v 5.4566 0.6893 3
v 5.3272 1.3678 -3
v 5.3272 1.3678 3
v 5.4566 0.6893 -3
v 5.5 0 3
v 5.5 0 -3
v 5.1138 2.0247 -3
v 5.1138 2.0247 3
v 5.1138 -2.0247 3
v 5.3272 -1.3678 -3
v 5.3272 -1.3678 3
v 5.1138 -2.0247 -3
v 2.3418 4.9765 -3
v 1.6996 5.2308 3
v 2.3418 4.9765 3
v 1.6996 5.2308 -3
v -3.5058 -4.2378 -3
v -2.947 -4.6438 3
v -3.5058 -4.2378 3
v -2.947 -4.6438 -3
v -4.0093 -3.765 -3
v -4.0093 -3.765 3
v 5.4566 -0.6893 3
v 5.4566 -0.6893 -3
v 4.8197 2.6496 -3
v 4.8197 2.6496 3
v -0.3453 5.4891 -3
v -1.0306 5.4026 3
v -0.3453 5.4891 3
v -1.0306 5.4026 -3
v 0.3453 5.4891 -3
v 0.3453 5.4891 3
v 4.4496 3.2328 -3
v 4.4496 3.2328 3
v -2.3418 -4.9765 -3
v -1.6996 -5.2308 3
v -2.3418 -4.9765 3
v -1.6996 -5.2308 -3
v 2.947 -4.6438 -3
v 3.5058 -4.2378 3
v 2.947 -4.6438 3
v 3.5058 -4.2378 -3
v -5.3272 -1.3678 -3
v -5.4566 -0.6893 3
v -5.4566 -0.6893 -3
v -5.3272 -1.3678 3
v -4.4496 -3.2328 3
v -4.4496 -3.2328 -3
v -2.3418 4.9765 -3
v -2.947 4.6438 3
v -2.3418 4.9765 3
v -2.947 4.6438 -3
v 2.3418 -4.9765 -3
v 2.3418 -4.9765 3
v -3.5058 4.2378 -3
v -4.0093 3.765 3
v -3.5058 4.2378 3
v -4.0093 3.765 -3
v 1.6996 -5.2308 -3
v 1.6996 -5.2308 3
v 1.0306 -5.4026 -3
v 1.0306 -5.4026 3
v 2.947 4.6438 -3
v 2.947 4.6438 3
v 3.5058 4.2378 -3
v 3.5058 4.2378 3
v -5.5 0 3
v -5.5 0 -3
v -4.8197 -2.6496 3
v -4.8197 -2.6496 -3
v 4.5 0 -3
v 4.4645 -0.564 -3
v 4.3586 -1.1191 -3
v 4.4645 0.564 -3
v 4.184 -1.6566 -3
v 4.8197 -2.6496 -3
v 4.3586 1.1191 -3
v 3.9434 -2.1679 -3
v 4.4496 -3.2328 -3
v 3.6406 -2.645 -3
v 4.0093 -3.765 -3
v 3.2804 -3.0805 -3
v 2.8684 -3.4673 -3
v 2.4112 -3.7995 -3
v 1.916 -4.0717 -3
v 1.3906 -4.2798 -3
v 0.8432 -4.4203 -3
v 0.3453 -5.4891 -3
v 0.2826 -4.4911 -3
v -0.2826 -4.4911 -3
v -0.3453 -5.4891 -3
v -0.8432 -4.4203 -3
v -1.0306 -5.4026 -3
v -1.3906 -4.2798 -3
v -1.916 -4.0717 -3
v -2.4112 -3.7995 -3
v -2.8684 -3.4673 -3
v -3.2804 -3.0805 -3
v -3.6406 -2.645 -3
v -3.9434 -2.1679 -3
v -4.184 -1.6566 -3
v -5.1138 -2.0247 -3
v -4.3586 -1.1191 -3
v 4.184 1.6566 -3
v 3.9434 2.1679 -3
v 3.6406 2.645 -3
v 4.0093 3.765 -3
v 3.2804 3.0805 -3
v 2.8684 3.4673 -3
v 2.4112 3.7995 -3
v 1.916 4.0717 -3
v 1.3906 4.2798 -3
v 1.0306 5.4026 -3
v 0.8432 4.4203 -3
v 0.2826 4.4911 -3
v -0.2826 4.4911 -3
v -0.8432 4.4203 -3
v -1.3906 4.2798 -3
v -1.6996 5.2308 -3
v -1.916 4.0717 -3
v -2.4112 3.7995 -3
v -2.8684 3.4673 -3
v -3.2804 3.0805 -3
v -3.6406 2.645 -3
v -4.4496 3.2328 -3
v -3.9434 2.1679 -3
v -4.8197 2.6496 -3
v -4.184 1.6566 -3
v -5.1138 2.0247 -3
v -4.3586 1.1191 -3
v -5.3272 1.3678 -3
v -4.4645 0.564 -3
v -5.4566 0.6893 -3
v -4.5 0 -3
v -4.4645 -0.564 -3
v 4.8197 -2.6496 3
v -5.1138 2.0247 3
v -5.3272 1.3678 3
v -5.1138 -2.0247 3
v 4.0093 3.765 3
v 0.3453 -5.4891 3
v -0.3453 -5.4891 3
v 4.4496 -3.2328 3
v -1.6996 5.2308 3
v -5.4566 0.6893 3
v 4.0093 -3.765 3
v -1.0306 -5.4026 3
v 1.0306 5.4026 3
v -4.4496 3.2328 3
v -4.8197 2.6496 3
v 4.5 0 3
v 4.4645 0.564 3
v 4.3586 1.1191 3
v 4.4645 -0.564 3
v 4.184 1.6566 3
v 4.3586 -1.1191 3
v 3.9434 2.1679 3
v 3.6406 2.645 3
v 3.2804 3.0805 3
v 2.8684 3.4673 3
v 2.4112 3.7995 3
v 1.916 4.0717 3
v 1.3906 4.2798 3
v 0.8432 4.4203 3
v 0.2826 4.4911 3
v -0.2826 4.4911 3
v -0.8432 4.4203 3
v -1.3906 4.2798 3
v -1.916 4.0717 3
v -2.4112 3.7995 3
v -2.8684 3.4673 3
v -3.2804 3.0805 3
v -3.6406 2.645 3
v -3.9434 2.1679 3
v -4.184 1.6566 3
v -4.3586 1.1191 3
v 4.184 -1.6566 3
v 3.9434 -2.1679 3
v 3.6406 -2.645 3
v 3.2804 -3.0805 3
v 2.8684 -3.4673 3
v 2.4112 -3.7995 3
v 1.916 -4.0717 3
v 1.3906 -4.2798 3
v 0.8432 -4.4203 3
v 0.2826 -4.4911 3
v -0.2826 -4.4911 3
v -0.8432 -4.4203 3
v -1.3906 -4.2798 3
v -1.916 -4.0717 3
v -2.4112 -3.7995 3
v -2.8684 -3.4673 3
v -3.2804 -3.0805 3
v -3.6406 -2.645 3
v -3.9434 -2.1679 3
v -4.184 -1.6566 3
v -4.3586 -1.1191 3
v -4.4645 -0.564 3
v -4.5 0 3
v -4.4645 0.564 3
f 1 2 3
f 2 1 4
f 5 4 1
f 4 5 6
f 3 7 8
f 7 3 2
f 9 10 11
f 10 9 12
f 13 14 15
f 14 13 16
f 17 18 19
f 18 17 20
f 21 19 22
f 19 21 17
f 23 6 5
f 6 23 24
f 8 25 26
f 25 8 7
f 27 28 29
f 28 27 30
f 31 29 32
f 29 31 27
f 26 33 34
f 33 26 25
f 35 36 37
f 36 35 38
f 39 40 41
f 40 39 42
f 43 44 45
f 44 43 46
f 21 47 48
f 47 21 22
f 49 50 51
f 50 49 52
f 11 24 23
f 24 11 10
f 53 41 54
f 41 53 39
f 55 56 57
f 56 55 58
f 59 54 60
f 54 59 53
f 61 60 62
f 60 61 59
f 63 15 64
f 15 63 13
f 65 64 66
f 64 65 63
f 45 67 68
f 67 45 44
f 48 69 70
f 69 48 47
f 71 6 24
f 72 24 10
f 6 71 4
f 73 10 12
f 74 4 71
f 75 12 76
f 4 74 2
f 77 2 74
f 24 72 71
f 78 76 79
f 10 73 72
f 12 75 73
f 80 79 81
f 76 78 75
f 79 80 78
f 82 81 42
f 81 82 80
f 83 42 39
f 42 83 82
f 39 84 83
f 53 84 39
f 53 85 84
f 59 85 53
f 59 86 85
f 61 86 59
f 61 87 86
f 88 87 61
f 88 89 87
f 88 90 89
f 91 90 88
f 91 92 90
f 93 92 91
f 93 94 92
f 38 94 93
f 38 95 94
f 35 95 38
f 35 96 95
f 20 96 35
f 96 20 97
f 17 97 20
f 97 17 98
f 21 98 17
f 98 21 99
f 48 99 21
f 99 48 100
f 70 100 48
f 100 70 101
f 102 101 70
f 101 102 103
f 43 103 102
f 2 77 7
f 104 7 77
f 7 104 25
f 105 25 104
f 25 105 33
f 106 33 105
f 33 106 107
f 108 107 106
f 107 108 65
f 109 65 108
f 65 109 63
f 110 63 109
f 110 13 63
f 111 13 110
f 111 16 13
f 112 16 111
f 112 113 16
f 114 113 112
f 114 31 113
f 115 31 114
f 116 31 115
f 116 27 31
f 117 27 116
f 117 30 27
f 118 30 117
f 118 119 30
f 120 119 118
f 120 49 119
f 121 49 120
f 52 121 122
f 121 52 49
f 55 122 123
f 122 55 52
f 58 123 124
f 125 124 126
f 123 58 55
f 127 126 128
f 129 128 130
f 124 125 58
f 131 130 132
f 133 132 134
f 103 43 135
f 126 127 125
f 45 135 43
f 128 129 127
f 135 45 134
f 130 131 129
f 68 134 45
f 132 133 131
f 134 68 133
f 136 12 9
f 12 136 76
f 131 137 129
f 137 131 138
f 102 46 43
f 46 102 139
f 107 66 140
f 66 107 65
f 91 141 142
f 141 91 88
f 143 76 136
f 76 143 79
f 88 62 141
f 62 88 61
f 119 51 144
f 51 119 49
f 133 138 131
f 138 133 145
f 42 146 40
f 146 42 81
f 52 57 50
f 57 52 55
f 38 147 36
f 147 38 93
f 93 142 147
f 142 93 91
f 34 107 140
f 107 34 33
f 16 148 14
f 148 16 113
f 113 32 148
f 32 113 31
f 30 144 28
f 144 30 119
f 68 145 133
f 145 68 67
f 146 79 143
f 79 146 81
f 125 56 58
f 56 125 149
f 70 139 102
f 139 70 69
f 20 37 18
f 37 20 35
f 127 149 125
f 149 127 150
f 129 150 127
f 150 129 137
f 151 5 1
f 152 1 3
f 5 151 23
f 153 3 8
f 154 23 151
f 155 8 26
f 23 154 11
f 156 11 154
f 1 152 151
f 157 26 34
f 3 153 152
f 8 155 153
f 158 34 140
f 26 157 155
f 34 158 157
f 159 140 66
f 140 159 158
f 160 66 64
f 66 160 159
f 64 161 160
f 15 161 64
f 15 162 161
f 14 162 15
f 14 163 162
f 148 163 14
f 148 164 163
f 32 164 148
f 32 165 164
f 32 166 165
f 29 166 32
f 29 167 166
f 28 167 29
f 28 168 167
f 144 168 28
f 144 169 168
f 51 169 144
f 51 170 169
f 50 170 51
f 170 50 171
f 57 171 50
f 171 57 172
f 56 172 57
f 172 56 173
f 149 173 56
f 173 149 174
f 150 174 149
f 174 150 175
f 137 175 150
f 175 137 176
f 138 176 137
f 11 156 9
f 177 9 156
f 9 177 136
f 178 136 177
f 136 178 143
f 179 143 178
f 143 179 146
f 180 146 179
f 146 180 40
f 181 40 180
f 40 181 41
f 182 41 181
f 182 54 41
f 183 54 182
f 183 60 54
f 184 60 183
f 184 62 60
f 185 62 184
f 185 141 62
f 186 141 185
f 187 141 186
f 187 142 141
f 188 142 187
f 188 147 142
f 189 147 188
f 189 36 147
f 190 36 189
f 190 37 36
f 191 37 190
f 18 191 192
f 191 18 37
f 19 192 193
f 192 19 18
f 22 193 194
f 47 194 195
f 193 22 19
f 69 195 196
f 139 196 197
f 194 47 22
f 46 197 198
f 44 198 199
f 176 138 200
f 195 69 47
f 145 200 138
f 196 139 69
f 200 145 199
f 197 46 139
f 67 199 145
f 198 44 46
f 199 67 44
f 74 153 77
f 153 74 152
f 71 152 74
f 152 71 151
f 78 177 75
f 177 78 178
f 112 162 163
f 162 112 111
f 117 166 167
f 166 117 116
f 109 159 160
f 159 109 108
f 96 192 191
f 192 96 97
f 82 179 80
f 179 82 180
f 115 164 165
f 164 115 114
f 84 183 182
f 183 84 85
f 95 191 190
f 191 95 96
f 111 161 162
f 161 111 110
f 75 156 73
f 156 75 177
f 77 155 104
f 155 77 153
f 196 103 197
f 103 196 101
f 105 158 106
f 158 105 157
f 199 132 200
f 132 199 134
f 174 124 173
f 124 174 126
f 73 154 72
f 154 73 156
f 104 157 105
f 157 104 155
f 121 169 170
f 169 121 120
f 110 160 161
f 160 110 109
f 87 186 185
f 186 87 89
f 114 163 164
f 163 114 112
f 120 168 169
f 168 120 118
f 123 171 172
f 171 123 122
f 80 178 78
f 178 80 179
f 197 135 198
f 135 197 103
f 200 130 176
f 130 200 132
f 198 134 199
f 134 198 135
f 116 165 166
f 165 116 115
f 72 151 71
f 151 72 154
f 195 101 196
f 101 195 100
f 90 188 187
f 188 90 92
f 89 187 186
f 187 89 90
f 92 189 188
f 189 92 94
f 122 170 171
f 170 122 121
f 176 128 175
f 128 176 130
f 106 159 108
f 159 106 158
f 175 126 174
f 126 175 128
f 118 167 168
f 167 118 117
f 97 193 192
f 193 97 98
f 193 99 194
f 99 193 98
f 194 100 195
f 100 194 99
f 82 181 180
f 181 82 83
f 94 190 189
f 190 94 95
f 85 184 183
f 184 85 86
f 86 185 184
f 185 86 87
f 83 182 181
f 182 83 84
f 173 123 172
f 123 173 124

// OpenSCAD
$fn = 50;


difference() {
	union() {
		translate(v = [0, 0, -3.0000000000]) {
			cylinder(h = 6, r = 5.5000000000);
		}
	}
	union() {
		translate(v = [0, 0, -100.0000000000]) {
			cylinder(h = 200, r = 4.5000000000);
		}
	}
}
